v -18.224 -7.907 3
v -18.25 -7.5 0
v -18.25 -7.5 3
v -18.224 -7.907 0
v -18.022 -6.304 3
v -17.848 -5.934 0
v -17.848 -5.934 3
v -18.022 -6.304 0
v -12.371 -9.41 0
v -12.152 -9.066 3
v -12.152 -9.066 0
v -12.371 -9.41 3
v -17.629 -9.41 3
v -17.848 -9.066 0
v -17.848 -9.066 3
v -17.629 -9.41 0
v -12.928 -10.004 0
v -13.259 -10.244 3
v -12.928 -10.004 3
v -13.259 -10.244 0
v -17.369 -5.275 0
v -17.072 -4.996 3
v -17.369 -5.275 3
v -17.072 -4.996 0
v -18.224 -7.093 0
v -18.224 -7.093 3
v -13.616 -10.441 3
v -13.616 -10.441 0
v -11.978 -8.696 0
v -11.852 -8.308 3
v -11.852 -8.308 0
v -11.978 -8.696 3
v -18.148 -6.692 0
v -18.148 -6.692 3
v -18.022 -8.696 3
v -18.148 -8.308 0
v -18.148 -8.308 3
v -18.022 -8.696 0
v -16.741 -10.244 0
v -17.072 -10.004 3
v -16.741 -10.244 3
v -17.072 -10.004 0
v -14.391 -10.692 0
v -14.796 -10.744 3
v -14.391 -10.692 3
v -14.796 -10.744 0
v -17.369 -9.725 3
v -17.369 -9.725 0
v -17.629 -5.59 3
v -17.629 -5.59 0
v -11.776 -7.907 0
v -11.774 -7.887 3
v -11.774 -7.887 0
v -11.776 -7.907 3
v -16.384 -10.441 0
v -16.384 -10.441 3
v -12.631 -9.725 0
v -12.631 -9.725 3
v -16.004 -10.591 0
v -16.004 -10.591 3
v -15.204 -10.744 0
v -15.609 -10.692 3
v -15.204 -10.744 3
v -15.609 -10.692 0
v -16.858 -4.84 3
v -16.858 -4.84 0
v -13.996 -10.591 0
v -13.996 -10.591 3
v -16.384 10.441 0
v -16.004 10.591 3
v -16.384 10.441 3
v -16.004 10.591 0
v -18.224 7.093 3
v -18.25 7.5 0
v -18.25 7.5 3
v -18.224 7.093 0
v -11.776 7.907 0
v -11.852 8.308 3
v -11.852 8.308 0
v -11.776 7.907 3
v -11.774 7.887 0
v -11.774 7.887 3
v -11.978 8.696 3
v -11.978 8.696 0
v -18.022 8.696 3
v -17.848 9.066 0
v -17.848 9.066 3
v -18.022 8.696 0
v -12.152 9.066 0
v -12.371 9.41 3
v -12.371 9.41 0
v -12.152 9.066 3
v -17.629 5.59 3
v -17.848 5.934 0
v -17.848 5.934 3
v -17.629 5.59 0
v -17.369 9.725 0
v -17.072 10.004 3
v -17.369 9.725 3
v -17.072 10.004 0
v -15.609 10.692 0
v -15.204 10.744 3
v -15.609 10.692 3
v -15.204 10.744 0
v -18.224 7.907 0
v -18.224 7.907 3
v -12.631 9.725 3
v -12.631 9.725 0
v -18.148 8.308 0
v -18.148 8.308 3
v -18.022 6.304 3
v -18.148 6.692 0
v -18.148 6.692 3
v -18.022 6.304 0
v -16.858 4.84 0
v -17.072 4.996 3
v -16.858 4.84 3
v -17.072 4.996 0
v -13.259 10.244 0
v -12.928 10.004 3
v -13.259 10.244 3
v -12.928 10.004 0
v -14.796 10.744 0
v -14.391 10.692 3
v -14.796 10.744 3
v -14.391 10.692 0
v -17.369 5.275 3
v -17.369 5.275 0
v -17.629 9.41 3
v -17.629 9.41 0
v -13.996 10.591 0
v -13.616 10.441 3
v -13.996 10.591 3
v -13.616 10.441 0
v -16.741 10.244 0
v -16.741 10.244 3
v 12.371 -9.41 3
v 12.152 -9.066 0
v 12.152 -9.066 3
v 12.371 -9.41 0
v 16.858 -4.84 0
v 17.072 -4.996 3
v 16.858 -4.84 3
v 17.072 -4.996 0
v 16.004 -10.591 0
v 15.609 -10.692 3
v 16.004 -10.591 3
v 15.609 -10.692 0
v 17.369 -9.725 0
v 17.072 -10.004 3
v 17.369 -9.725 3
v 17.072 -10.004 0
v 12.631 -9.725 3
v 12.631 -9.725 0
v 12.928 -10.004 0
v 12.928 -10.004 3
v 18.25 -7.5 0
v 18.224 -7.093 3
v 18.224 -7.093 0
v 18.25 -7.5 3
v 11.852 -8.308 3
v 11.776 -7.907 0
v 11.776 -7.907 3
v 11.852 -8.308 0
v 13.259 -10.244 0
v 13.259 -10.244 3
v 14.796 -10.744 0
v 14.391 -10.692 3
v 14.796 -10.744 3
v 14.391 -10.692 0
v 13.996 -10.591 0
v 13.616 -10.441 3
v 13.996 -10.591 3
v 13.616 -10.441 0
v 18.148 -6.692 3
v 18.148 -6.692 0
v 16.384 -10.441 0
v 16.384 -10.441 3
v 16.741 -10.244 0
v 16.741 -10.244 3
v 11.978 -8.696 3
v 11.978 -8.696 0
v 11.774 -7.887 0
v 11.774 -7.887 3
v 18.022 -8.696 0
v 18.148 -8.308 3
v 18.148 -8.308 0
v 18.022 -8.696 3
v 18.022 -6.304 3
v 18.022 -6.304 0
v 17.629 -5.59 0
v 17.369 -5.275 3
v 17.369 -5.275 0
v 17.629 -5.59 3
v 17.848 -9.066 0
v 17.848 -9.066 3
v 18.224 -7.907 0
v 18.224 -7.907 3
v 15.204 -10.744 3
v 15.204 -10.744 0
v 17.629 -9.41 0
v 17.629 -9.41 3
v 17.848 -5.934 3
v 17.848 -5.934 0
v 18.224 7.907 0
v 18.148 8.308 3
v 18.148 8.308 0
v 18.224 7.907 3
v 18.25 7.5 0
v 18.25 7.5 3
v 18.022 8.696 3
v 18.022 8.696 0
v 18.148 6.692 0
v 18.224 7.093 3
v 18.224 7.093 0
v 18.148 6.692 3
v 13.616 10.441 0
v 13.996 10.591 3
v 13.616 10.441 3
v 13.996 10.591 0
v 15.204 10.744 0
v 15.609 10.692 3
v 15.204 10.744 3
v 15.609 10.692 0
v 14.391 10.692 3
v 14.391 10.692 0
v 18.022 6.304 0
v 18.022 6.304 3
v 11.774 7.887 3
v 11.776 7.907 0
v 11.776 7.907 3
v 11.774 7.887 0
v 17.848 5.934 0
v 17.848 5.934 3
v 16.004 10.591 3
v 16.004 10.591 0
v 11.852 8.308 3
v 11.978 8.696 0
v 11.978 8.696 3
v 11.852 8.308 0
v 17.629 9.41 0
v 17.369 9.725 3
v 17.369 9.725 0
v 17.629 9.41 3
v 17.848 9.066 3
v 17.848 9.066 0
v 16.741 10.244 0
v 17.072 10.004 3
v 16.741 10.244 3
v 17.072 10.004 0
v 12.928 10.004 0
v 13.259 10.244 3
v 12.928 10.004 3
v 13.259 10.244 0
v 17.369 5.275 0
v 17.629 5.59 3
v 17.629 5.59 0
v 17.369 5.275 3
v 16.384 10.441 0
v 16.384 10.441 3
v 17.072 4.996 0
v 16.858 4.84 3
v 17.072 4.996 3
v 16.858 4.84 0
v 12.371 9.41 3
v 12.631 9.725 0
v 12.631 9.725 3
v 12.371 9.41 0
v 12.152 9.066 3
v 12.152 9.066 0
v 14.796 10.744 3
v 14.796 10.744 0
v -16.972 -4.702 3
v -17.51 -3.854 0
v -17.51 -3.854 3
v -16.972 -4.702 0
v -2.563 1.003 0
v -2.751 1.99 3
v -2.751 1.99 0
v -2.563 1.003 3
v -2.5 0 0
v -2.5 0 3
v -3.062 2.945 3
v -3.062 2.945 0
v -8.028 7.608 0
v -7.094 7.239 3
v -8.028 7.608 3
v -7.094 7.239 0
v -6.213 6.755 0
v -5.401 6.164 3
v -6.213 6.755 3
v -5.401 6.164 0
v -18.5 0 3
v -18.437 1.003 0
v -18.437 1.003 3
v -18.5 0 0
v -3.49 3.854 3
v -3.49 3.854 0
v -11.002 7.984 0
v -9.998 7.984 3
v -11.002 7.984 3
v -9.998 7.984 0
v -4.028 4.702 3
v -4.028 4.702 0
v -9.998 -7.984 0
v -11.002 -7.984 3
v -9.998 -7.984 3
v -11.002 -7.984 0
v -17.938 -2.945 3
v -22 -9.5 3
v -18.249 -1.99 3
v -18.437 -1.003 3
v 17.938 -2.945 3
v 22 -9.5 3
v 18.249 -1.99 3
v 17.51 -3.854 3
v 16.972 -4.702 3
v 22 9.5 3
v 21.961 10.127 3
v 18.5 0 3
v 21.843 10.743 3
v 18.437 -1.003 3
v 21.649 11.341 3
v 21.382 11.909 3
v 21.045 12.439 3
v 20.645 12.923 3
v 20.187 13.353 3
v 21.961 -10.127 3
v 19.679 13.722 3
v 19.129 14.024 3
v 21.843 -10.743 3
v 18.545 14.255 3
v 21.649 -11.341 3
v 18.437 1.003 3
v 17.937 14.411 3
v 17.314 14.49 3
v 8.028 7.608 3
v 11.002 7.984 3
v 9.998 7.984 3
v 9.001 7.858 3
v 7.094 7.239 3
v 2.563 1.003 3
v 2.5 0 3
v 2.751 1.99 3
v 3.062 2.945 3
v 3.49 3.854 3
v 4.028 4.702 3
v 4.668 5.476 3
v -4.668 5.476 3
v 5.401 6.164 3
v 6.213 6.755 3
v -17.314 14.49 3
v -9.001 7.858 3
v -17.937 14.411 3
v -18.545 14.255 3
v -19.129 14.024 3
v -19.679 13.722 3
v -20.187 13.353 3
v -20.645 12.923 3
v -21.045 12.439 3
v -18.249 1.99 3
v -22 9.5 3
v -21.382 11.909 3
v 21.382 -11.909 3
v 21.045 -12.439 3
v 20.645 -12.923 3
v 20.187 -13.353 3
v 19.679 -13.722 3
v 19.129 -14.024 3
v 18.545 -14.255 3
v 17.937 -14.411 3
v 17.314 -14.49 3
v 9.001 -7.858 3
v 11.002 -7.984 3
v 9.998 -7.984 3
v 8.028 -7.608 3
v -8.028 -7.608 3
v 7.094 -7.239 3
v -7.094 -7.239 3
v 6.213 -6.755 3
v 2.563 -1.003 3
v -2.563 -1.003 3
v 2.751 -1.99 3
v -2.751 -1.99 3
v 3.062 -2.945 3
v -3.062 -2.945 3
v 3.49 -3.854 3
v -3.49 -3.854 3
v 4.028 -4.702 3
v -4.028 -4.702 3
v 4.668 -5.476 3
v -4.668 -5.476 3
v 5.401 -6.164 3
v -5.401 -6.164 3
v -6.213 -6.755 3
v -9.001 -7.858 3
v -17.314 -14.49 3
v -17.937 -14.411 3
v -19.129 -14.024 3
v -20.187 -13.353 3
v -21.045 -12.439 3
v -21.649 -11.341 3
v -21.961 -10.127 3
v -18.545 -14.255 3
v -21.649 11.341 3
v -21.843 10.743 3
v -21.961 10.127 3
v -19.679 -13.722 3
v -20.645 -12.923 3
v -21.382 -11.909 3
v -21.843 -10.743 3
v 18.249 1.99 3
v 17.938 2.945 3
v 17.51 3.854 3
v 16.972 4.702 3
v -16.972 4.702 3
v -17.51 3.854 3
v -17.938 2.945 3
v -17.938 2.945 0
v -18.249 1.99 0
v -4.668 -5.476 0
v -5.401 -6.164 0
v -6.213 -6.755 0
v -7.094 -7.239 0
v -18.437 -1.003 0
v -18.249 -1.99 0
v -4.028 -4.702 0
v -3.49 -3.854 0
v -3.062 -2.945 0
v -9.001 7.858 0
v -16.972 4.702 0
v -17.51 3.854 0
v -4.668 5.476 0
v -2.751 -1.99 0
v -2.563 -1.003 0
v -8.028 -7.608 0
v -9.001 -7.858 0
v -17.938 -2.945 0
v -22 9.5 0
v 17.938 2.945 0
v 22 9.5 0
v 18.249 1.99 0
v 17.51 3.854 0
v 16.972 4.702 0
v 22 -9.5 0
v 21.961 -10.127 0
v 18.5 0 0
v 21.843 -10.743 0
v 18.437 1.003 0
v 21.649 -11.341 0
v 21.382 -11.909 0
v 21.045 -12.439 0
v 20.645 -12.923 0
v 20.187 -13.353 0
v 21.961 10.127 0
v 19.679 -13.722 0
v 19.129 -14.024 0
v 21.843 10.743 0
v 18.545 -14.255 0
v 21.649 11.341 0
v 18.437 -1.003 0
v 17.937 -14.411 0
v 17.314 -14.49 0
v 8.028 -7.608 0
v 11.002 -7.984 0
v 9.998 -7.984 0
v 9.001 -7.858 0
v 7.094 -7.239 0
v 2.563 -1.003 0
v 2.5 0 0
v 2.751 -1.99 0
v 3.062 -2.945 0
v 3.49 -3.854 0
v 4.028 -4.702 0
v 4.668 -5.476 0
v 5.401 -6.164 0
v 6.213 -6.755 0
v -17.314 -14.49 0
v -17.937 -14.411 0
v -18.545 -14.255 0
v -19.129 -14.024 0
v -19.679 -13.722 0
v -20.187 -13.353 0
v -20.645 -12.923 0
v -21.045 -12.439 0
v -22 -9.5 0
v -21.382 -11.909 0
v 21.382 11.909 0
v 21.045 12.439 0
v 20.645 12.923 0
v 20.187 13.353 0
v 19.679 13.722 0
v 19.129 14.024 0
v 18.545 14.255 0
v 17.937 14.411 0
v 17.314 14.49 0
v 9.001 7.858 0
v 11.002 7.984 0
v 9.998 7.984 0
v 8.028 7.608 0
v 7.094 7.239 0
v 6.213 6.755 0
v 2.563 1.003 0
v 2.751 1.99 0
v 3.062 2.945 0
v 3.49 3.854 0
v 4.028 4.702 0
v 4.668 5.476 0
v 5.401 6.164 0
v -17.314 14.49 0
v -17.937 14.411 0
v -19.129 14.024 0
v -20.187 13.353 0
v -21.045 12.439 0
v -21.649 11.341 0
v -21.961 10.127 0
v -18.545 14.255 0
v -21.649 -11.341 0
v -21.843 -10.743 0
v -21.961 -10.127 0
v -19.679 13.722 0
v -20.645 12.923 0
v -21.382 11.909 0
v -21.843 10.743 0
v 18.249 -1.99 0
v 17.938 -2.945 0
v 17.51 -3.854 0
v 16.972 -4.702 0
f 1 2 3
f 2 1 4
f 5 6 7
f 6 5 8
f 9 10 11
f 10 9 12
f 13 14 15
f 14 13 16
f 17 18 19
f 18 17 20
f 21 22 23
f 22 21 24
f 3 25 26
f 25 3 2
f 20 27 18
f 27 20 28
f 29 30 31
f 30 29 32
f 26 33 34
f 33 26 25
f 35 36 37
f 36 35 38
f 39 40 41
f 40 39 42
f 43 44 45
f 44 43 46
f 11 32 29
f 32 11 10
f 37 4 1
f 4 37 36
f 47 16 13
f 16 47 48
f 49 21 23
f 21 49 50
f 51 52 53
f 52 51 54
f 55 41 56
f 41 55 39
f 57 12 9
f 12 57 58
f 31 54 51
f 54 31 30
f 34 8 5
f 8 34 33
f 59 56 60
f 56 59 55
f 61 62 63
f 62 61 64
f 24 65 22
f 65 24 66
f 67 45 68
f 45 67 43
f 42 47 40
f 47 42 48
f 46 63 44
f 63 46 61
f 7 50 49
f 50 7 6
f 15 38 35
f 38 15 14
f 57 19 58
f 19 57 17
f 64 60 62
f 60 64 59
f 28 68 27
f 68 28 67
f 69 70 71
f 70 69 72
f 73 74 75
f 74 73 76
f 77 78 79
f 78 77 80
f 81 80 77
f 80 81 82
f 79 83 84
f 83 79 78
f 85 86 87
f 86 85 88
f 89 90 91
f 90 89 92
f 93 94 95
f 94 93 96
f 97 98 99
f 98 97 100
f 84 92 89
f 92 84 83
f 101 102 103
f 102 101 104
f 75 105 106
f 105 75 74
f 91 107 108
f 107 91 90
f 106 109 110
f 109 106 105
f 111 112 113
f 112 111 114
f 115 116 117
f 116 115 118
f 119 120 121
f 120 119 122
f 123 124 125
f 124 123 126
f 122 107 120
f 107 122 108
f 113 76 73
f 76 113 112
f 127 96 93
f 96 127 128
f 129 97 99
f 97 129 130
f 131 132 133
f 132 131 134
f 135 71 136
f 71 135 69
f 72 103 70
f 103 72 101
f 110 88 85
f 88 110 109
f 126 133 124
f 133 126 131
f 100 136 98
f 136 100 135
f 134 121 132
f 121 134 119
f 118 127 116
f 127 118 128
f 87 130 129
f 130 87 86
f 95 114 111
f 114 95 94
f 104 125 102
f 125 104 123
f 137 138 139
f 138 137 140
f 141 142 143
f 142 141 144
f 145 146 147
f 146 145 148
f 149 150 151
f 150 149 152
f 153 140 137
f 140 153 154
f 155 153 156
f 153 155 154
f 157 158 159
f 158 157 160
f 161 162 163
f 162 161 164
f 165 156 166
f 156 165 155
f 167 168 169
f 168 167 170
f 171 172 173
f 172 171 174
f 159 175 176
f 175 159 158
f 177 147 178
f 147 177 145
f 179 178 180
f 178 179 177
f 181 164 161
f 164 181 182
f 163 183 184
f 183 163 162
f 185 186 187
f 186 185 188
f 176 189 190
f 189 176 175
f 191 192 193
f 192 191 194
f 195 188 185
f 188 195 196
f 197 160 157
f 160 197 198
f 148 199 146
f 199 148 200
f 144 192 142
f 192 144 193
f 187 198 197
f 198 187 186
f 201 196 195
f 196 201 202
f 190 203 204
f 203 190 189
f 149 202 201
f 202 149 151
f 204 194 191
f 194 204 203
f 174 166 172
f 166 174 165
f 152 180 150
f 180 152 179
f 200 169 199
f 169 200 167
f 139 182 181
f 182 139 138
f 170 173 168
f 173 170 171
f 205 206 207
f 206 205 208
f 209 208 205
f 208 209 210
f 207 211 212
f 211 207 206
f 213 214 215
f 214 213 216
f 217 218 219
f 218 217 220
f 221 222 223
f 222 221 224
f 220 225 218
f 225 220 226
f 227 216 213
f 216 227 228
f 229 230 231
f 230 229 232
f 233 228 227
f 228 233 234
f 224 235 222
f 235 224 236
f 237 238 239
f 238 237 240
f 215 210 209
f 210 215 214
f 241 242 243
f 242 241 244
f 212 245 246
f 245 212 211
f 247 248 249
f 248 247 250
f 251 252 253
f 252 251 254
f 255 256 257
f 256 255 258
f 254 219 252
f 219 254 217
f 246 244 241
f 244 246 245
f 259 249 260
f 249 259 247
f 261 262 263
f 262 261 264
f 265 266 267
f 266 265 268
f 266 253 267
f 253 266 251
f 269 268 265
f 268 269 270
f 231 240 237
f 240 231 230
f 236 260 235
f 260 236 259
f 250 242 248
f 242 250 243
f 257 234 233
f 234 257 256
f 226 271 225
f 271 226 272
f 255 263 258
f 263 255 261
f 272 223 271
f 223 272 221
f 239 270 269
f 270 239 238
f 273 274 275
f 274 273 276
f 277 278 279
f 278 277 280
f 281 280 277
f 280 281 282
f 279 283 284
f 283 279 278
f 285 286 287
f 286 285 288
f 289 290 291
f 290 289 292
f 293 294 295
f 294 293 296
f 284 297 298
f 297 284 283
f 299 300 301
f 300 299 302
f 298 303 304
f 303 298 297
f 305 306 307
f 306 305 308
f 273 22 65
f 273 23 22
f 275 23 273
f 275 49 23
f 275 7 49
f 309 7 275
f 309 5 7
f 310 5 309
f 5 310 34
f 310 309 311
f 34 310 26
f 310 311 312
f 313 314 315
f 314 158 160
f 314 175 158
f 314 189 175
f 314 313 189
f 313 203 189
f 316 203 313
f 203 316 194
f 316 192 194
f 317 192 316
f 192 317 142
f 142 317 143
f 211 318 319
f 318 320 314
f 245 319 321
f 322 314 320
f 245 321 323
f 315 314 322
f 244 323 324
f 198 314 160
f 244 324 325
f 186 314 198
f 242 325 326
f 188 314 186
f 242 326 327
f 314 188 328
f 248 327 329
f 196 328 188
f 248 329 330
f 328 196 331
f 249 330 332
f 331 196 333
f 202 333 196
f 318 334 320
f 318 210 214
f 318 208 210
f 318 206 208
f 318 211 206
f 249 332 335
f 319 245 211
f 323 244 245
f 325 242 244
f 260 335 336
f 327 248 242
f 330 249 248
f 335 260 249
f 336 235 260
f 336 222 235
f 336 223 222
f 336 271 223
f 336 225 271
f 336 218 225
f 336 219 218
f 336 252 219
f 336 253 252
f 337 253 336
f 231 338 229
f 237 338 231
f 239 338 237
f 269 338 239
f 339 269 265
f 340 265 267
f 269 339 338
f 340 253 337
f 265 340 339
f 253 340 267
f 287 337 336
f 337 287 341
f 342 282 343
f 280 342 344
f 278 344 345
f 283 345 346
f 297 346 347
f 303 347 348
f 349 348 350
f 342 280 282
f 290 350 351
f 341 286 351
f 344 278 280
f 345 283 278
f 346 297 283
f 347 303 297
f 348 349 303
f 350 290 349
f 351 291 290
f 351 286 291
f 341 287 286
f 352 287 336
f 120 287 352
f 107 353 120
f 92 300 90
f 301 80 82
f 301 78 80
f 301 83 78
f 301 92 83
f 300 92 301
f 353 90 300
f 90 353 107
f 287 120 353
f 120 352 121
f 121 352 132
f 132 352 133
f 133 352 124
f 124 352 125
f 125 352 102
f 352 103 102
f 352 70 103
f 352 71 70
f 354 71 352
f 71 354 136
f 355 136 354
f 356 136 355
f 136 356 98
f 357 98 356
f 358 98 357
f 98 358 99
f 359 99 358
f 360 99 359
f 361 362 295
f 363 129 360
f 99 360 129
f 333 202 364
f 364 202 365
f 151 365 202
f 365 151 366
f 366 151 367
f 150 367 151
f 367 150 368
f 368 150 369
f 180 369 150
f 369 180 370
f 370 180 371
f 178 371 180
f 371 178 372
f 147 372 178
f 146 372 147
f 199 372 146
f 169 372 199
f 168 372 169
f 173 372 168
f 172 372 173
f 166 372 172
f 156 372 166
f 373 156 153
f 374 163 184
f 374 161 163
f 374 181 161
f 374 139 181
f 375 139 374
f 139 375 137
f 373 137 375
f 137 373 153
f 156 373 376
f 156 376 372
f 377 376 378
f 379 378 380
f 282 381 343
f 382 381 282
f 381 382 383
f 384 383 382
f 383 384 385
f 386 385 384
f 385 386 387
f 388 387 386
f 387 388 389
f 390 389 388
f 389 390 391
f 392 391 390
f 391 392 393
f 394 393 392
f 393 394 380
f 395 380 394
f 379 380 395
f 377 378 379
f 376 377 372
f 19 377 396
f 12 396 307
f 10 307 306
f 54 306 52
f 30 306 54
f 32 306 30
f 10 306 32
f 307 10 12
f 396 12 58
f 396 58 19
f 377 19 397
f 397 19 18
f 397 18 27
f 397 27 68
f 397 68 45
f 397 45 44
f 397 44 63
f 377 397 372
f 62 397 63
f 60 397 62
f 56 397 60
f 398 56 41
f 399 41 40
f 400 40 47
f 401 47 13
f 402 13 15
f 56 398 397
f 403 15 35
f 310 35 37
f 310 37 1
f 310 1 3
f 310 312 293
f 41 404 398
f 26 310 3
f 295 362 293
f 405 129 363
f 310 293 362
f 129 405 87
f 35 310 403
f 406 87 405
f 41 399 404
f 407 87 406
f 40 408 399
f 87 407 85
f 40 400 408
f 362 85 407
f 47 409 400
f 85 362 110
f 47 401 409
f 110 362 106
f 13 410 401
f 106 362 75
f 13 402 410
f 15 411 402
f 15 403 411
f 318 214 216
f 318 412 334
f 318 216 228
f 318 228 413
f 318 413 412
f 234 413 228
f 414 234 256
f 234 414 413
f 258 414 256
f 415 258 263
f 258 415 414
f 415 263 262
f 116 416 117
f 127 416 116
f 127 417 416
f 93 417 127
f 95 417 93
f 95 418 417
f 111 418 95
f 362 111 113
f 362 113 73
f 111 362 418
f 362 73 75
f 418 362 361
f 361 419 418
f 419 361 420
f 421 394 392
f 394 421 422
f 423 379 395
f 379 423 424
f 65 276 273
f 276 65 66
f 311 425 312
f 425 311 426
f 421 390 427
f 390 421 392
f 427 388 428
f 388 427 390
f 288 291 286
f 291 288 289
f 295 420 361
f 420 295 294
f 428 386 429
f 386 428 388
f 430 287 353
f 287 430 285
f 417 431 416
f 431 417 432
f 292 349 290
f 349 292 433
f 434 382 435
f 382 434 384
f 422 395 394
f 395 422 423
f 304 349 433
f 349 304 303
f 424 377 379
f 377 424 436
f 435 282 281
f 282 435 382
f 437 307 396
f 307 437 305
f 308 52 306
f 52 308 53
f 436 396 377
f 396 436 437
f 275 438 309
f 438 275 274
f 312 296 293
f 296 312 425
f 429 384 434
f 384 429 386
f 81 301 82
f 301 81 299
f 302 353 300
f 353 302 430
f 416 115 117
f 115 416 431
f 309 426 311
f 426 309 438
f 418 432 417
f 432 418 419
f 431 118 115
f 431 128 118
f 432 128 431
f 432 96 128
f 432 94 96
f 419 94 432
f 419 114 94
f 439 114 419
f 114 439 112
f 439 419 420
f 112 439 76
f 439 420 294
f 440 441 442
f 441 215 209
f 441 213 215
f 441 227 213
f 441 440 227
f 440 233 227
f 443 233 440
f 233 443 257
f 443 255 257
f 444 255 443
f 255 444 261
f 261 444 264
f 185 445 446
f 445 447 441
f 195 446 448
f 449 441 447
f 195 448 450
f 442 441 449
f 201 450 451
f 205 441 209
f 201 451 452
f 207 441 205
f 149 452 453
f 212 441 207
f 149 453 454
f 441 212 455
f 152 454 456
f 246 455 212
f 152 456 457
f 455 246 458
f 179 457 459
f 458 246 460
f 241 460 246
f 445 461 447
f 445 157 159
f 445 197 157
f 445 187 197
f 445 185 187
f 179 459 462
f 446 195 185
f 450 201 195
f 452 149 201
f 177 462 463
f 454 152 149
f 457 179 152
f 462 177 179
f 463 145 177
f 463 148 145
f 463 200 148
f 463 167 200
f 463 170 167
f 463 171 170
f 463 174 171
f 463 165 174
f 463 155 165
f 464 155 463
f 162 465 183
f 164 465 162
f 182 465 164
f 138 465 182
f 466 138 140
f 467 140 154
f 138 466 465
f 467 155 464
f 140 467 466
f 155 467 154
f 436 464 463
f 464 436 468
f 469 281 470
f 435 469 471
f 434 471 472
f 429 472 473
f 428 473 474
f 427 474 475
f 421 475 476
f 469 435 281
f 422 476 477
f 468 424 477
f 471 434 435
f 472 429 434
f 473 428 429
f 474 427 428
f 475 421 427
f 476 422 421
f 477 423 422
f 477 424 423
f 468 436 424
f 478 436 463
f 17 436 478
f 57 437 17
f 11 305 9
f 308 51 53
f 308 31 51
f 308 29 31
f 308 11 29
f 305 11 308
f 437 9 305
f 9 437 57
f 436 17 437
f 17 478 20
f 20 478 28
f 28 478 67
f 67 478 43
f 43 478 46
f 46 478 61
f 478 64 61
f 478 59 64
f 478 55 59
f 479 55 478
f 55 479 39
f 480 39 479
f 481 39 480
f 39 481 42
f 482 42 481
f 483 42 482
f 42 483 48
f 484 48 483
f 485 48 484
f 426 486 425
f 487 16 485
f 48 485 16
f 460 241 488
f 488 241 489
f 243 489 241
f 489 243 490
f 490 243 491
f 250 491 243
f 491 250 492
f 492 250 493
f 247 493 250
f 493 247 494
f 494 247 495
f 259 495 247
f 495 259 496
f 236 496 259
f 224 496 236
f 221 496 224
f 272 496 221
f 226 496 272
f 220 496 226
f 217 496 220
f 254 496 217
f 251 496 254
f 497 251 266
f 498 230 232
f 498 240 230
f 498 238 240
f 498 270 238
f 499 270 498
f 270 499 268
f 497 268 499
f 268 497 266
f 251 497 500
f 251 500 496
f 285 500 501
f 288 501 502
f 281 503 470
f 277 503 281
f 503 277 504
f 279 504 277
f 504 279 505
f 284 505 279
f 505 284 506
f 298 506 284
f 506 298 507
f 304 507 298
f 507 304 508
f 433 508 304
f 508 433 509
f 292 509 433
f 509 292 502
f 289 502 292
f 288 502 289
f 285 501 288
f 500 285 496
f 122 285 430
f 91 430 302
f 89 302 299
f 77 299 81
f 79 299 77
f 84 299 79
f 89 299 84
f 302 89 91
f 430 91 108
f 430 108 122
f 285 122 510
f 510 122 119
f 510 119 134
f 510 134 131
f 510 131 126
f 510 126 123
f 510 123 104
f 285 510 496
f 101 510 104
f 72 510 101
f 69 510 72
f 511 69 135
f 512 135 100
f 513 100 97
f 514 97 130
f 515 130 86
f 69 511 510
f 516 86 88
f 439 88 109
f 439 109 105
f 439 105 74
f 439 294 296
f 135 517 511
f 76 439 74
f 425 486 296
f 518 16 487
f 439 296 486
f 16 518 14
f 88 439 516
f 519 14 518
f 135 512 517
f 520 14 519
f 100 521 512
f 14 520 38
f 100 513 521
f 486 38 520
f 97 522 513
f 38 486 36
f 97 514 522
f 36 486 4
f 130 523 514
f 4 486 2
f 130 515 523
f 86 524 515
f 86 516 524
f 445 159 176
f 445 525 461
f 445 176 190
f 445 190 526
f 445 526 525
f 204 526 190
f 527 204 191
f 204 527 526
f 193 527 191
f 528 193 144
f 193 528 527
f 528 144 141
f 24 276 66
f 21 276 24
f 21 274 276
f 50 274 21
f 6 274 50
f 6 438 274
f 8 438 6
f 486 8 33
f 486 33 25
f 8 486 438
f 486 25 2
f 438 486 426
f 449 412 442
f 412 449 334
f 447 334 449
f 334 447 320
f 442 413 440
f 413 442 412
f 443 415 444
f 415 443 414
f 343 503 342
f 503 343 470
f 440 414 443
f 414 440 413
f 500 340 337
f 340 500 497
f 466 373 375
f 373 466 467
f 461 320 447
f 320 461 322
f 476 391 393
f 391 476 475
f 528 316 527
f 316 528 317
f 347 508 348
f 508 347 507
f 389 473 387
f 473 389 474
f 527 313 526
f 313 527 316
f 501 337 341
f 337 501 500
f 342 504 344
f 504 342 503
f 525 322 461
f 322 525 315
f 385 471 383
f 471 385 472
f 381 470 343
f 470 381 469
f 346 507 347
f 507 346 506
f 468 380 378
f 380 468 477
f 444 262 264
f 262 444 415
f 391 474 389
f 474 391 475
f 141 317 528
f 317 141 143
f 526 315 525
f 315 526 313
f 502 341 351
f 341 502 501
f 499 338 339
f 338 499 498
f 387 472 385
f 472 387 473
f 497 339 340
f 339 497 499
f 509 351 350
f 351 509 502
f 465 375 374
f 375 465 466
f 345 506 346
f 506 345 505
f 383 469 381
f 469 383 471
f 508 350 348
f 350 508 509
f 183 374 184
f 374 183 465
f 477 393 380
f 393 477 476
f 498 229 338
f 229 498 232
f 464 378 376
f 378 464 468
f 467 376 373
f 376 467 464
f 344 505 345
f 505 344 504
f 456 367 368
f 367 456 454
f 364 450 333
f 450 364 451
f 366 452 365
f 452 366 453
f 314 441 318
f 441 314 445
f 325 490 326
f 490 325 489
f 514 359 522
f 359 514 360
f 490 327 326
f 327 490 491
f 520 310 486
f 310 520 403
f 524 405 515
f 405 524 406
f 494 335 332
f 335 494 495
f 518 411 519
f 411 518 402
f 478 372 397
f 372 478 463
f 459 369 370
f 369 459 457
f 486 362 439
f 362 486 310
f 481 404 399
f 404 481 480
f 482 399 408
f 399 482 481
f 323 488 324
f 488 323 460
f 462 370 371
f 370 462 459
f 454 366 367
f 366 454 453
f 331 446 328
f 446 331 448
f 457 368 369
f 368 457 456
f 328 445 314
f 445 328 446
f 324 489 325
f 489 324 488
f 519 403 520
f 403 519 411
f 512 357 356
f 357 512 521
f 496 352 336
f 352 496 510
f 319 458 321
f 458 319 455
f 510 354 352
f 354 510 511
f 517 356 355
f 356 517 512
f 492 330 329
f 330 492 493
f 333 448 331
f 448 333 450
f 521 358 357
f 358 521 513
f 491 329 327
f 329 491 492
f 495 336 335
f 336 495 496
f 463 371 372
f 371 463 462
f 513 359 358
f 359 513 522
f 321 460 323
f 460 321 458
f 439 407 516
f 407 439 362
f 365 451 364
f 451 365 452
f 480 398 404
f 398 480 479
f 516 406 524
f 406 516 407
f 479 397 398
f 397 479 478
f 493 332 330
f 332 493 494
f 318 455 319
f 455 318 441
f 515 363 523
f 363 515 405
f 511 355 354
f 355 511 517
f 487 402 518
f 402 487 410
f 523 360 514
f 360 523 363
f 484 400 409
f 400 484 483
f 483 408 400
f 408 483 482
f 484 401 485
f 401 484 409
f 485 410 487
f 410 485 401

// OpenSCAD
$fn = 50;


difference() {
	union() {
		hull() {
			translate(v = [-17.0000000000, 9.5000000000, 0]) {
				cylinder(h = 3, r = 5);
			}
			translate(v = [17.0000000000, 9.5000000000, 0]) {
				cylinder(h = 3, r = 5);
			}
			translate(v = [-17.0000000000, -9.5000000000, 0]) {
				cylinder(h = 3, r = 5);
			}
			translate(v = [17.0000000000, -9.5000000000, 0]) {
				cylinder(h = 3, r = 5);
			}
		}
	}
	union() {
		#translate(v = [-15.0000000000, -7.5000000000, -100.0000000000]) {
			cylinder(h = 200, r = 3.2500000000);
		}
		#translate(v = [-15.0000000000, 7.5000000000, -100.0000000000]) {
			cylinder(h = 200, r = 3.2500000000);
		}
		#translate(v = [15.0000000000, -7.5000000000, -100.0000000000]) {
			cylinder(h = 200, r = 3.2500000000);
		}
		#translate(v = [15.0000000000, 7.5000000000, -100.0000000000]) {
			cylinder(h = 200, r = 3.2500000000);
		}
		#translate(v = [-10.5000000000, 0, 0]) {
			cylinder(h = 3, r = 8.0000000000);
		}
		#translate(v = [10.5000000000, 0, 0]) {
			cylinder(h = 3, r = 8.0000000000);
		}
	}
}
